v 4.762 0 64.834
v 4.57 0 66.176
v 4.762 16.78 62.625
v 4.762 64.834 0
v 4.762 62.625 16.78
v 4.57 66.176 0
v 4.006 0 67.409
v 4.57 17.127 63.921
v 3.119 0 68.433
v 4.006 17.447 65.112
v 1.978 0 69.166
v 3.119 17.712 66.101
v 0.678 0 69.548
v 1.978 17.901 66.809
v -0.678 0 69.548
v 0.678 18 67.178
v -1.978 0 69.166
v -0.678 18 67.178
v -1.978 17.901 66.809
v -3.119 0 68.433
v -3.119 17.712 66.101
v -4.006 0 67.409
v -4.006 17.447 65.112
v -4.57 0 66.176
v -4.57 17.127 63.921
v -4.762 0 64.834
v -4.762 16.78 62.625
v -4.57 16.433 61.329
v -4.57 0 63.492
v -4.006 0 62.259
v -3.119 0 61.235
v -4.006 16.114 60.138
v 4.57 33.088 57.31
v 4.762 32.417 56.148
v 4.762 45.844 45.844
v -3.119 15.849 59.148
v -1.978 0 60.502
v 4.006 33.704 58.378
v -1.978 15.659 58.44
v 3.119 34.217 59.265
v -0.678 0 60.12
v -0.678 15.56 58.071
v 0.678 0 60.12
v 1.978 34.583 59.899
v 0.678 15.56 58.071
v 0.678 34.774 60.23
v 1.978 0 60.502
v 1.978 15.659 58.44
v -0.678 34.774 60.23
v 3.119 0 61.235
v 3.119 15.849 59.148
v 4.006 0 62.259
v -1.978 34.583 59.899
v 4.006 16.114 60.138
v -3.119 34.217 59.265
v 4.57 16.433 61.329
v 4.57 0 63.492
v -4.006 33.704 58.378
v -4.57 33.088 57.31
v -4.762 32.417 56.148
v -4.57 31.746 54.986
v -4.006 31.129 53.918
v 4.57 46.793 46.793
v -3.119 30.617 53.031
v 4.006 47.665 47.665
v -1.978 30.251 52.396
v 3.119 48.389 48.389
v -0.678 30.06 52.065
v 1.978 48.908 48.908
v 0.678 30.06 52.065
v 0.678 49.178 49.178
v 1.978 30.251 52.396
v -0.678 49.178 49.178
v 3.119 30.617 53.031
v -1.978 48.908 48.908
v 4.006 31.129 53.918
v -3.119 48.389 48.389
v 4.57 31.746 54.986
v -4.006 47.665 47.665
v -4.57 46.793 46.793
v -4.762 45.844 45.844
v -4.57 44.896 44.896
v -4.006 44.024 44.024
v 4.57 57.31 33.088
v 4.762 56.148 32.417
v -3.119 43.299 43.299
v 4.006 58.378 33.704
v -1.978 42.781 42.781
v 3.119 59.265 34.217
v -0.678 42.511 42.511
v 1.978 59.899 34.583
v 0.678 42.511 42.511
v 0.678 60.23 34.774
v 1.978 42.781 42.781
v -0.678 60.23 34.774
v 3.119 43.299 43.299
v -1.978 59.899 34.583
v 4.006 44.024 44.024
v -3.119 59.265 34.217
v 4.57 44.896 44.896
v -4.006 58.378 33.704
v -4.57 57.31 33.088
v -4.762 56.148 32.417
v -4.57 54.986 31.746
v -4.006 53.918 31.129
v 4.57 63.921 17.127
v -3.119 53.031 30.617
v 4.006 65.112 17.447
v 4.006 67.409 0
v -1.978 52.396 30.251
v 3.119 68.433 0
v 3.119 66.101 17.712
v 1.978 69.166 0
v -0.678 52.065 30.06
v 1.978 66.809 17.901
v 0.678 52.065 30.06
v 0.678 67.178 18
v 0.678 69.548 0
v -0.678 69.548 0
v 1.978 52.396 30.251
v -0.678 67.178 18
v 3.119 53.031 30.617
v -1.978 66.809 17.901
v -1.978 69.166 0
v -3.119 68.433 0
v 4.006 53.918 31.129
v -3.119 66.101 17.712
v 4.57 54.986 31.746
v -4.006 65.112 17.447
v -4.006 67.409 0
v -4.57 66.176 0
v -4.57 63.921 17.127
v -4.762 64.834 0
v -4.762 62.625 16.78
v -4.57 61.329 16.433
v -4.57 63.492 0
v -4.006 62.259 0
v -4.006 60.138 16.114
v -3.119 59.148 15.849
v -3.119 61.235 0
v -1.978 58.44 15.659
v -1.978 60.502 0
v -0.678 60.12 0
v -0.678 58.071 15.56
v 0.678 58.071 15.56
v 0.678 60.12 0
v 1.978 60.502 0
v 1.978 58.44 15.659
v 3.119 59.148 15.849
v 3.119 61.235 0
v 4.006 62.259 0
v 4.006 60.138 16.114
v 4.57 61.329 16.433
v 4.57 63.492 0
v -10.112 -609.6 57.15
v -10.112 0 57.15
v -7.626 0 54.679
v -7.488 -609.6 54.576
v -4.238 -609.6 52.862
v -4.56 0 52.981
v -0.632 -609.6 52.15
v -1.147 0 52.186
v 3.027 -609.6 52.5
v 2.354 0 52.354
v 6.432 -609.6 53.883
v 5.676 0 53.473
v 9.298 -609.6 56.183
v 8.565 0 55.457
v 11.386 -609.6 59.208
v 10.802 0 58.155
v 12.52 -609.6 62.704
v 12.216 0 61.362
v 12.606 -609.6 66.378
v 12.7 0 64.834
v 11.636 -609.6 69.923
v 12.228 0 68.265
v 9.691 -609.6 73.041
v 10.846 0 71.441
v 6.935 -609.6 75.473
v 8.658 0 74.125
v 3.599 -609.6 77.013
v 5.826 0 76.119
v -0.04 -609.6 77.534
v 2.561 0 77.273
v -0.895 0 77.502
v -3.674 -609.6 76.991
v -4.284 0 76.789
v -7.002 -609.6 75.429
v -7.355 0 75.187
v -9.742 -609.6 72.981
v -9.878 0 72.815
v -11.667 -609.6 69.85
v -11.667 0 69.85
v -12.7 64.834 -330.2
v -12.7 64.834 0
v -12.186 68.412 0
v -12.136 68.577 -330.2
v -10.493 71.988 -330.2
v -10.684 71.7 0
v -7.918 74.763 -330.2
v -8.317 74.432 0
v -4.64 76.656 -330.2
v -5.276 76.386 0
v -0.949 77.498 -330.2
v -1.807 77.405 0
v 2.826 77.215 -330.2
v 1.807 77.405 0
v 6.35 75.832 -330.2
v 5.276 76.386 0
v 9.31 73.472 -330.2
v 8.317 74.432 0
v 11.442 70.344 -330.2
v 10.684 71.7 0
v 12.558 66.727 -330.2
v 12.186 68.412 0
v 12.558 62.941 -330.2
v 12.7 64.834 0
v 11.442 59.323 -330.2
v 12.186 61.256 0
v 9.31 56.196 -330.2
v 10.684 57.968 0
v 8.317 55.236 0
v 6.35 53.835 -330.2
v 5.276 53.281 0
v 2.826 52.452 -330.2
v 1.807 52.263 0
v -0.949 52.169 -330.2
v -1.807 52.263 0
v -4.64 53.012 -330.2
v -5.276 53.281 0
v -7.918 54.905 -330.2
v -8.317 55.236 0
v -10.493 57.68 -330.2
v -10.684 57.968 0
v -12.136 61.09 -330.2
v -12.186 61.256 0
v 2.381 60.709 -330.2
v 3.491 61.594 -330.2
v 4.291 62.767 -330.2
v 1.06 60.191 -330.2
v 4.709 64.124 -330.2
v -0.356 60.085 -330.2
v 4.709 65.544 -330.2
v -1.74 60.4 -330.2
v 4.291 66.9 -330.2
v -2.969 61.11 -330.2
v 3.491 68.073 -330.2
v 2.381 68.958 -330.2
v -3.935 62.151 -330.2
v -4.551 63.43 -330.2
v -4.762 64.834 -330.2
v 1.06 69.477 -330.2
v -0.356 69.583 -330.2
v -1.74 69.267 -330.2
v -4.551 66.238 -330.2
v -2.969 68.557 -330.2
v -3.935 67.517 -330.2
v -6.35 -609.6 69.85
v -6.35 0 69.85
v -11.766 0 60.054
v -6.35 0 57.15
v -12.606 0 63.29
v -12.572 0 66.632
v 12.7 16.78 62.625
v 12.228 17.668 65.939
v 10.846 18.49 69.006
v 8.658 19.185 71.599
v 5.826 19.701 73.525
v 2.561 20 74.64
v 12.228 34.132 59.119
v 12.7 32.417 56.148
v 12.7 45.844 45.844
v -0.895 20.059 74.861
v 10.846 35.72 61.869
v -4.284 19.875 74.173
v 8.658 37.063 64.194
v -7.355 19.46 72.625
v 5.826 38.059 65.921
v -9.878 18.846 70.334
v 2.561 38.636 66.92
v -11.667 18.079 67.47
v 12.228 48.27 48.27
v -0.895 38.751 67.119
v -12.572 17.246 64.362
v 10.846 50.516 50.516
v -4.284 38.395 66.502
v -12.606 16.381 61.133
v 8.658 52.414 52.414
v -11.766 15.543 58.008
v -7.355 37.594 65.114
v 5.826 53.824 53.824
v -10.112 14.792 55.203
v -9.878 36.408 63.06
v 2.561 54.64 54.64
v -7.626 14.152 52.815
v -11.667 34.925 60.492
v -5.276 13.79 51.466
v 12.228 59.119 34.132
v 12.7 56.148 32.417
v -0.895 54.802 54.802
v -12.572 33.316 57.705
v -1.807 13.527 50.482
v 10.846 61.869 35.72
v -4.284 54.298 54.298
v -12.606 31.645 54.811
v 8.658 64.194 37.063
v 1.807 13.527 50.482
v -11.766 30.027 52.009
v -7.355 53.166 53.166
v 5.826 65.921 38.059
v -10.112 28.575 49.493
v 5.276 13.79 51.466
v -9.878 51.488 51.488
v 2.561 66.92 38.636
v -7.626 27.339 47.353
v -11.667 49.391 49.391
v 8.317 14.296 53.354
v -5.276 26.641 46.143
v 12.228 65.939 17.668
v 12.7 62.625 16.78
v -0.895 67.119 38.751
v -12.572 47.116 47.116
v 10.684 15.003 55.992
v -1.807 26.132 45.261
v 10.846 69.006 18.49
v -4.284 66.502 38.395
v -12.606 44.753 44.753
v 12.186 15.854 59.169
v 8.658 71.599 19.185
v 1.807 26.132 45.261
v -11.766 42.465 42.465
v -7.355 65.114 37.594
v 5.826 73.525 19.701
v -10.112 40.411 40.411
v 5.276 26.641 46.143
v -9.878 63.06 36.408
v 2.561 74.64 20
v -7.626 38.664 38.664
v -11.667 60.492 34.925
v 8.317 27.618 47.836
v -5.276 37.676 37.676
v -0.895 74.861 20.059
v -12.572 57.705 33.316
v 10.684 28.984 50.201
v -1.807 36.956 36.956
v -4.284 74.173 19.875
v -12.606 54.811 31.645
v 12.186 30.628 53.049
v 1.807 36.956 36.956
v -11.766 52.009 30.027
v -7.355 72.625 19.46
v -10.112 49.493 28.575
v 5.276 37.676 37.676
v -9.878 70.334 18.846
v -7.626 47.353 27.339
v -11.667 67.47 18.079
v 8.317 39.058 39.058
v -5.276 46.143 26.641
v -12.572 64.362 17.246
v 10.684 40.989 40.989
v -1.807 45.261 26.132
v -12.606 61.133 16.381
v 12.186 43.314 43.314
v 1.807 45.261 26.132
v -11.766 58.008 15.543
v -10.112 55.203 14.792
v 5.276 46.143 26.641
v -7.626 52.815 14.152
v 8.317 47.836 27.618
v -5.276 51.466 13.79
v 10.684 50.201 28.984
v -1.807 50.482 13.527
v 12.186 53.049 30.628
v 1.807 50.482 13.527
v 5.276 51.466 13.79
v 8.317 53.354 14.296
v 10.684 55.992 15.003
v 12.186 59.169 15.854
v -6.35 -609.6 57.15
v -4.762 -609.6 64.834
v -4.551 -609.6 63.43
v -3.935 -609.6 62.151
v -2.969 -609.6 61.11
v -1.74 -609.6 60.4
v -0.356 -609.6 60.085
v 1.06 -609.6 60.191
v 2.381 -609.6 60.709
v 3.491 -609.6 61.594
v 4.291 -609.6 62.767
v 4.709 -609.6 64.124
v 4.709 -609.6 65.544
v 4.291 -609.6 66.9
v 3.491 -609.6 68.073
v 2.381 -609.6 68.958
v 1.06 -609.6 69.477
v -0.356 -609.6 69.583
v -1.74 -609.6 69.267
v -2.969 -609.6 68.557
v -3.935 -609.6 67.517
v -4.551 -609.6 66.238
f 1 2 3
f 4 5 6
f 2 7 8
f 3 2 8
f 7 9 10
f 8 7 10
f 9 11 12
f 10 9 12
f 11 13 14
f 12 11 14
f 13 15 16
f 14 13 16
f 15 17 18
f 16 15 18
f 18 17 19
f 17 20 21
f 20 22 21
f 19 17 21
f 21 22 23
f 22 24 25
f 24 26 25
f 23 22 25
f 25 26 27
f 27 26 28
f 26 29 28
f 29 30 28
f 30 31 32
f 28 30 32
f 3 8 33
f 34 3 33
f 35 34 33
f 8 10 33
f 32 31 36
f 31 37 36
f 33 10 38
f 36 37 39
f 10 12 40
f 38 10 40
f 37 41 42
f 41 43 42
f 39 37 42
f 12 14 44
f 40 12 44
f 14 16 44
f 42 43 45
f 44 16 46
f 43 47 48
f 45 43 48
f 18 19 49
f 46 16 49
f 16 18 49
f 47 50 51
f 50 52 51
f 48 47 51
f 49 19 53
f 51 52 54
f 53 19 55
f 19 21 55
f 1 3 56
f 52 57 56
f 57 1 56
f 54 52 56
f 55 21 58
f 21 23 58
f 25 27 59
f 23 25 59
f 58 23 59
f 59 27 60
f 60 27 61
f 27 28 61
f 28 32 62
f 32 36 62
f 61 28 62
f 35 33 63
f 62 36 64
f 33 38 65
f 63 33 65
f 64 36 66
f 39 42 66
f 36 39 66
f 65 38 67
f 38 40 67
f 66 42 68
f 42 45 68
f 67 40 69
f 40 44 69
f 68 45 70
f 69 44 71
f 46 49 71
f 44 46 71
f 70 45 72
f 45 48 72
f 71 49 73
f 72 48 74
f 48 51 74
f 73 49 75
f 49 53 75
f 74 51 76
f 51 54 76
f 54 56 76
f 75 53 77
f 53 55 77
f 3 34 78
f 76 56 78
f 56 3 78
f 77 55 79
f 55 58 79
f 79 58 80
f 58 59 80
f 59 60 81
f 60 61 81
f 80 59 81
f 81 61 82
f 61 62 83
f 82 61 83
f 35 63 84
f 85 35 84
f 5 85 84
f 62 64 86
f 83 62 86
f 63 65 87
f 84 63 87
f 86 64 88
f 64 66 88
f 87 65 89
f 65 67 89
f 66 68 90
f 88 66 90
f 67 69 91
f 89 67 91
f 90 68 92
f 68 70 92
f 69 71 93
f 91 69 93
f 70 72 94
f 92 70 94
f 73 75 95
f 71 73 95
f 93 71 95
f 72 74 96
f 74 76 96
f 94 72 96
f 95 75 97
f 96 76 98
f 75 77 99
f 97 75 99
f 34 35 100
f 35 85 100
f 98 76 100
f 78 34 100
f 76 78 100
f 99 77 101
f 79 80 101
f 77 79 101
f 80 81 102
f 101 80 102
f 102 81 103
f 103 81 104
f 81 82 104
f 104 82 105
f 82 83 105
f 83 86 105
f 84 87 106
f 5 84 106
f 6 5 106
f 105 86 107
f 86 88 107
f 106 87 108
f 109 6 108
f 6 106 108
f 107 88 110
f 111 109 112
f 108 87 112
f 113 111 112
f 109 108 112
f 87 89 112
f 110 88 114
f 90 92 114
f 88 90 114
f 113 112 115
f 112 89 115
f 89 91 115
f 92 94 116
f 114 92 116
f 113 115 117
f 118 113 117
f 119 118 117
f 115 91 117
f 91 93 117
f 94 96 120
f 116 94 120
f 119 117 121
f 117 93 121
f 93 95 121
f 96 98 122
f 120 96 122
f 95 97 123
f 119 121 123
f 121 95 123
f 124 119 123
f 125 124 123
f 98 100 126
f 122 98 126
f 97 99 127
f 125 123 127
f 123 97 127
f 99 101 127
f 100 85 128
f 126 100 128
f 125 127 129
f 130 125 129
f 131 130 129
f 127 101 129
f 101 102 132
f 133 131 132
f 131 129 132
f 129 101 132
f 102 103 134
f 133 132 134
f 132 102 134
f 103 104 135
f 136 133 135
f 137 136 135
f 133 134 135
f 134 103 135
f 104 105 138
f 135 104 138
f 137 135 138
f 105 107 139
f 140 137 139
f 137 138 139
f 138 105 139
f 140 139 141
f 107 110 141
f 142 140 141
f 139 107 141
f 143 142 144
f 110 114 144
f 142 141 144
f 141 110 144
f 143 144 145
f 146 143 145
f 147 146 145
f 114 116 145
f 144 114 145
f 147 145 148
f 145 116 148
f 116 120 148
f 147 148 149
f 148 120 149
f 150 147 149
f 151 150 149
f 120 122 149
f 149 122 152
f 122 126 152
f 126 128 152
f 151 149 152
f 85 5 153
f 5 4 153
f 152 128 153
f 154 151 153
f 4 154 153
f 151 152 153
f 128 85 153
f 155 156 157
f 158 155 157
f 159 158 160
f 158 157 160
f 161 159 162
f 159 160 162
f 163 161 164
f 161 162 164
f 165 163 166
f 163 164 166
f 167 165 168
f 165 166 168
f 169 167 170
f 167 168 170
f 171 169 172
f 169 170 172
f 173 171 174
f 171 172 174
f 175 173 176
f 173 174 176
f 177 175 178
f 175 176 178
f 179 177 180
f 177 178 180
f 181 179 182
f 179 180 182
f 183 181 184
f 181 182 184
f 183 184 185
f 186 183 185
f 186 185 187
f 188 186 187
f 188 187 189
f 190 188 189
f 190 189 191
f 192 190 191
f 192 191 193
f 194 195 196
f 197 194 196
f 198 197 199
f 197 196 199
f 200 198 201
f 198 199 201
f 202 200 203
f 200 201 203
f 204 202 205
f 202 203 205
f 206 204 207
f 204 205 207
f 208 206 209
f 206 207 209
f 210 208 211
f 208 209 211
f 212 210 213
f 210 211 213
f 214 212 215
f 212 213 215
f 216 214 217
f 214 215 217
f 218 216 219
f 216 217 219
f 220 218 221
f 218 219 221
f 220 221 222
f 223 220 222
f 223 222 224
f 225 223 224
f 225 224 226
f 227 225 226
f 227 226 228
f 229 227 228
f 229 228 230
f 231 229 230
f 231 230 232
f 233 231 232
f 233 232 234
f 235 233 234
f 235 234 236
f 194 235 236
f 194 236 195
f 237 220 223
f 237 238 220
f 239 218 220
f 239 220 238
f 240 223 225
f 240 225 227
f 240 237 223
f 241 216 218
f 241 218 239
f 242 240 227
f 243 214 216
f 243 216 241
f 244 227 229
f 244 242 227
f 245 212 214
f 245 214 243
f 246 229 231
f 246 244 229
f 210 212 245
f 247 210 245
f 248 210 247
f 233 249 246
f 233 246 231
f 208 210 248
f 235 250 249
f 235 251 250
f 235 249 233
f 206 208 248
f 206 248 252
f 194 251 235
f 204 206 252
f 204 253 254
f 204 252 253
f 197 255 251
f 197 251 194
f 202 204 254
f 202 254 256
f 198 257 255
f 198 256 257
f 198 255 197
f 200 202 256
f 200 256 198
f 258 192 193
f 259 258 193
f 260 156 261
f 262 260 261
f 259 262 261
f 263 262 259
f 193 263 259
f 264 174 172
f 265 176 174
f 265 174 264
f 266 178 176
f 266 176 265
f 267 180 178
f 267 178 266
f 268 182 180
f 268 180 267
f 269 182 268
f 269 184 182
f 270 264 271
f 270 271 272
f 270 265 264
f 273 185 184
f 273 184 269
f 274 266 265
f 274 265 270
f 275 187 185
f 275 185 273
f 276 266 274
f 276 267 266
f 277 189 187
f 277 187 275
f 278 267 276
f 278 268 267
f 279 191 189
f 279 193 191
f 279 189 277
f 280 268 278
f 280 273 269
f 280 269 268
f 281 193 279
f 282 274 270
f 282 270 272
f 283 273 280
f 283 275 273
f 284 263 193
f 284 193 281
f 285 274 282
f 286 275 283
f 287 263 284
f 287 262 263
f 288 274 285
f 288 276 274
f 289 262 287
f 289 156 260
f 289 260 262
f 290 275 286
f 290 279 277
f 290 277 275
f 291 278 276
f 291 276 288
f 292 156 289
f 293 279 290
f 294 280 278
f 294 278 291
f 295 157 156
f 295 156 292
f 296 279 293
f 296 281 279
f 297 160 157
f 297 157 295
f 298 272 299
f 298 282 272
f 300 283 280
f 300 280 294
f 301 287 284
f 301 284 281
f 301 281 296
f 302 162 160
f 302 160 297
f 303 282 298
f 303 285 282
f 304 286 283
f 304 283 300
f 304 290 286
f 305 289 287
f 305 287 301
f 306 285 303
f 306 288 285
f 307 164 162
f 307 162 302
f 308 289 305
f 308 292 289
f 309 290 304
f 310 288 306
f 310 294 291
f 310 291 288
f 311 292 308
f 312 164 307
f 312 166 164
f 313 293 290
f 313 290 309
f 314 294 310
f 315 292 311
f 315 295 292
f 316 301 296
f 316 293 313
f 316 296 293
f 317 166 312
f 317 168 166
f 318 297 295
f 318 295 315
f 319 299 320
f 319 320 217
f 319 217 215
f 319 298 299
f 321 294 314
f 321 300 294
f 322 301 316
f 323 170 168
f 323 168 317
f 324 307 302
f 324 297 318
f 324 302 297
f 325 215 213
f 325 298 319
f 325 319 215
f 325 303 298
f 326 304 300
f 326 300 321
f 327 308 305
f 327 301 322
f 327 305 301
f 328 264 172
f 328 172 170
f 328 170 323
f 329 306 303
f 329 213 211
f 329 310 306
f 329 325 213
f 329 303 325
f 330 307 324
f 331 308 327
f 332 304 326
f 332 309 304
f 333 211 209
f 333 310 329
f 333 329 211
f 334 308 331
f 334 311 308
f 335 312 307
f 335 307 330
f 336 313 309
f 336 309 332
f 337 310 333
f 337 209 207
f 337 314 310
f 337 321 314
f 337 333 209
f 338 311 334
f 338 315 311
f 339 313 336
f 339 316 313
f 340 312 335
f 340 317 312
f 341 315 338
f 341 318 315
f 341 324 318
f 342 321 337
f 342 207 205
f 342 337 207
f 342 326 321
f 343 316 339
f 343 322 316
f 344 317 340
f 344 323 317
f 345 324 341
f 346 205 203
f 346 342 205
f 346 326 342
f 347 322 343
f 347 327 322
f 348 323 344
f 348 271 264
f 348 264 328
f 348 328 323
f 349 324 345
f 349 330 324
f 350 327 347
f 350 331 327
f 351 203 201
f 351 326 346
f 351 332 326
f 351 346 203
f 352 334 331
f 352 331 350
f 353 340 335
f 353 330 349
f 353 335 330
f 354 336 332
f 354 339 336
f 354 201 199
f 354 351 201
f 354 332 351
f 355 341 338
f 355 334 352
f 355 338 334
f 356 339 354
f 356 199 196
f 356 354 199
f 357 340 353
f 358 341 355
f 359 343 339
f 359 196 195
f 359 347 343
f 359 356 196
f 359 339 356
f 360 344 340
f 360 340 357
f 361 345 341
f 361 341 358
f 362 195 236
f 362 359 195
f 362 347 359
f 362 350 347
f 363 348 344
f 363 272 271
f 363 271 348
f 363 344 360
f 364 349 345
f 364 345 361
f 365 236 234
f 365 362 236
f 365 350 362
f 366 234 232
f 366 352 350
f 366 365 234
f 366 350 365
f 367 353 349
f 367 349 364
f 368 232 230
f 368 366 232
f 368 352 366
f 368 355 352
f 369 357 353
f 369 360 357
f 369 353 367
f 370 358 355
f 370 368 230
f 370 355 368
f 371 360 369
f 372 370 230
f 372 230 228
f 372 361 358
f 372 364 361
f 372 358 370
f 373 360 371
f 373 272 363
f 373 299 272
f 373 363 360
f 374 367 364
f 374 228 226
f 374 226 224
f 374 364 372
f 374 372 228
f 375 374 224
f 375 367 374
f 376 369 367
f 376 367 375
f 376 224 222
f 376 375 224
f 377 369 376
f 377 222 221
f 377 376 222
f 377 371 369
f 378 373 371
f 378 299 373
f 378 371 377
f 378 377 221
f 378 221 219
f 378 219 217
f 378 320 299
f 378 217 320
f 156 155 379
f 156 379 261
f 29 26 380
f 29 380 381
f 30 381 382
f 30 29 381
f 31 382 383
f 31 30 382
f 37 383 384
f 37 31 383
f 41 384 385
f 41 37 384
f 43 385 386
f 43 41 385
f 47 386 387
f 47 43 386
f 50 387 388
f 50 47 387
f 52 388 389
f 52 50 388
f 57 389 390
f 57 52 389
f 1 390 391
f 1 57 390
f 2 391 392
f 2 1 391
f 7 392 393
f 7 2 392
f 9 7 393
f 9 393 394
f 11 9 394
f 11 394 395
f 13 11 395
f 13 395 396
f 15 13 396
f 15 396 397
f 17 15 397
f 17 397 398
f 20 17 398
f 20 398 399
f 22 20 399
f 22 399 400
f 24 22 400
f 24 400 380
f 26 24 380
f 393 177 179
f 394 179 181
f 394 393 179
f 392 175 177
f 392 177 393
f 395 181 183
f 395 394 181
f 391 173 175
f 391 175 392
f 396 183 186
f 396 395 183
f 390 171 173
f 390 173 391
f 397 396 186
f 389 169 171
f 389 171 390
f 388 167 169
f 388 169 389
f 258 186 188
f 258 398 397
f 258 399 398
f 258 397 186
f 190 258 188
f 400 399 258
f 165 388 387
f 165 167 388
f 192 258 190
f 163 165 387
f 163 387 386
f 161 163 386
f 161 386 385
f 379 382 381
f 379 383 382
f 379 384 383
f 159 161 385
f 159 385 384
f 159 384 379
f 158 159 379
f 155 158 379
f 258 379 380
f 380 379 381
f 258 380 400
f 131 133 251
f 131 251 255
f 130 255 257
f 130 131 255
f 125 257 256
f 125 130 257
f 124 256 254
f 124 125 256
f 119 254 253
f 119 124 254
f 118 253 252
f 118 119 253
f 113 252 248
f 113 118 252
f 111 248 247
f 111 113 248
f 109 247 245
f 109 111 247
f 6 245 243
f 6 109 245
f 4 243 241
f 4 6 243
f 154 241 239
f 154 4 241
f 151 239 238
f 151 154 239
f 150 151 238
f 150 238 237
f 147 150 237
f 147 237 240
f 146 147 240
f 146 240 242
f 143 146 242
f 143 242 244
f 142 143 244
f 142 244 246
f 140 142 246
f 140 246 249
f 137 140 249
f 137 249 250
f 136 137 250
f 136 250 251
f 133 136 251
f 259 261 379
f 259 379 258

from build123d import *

# Parameters (mm, degrees)
SKETCH3_R           = 12.7
SKETCH3_R_2         = 4.7625
SKETCH4_R           = 12.7
SKETCH4_R_2         = 4.7625
BOSS_EXTRUDE3_DEPTH = 609.6
SKETCH5_R           = 12.7
SKETCH5_R_2         = 4.7625
BOSS_EXTRUDE4_DEPTH = 330.2
SKETCH6_W           = 12.7
SKETCH6_H           = 609.6
CUT_EXTRUDE1_DEPTH  = 6.35


with BuildPart() as part:
    # Sweep1: sweep along a path in Sketch2
    with BuildLine(Plane(origin=(0, 0, 0), x_dir=(0, 0, -1), z_dir=(1, 0, 0))) as sweep1_path:
        ThreePointArc((-64.833774642, 0), (-45.844401699, 45.844401699), (0, 64.833774642))
    # Sketch3 → Sweep1 (sweep)
    with BuildSketch(Plane(origin=(0, 0, 0), x_dir=(1, 0, 0), z_dir=(0, 1, 0))):
        with Locations((0, -64.833774642)):
            Circle(SKETCH3_R)
        with Locations((0, -64.833774642)):
            Circle(SKETCH3_R_2, mode=Mode.SUBTRACT)
    sweep(path=sweep1_path.line)

    # Sketch4 → Boss-Extrude3 (add)
    with BuildSketch(Plane(origin=(0, 0, 0), x_dir=(-1, 0, 0), z_dir=(0, -1, 0))):
        with Locations((0, -64.833774642)):
            Circle(SKETCH4_R)
        with Locations((0, -64.833774642)):
            Circle(SKETCH4_R_2, mode=Mode.SUBTRACT)
    extrude(amount=BOSS_EXTRUDE3_DEPTH)

    # Sketch5 → Boss-Extrude4 (add)
    with BuildSketch(Plane(origin=(0, 0, 0), x_dir=(-1, 0, 0), z_dir=(0, 0, -1))):
        with Locations((0, 64.833774642)):
            Circle(SKETCH5_R)
        with Locations((0, 64.833774642)):
            Circle(SKETCH5_R_2, mode=Mode.SUBTRACT)
    extrude(amount=BOSS_EXTRUDE4_DEPTH)

    # Sketch6 → Cut-Extrude1 (cut)
    with BuildSketch(Plane.ZY.offset(12.7)):
        with Locations((63.5, -304.8)):
            Rectangle(SKETCH6_W, SKETCH6_H)
    extrude(amount=-CUT_EXTRUDE1_DEPTH, mode=Mode.SUBTRACT)


solid = part.part
